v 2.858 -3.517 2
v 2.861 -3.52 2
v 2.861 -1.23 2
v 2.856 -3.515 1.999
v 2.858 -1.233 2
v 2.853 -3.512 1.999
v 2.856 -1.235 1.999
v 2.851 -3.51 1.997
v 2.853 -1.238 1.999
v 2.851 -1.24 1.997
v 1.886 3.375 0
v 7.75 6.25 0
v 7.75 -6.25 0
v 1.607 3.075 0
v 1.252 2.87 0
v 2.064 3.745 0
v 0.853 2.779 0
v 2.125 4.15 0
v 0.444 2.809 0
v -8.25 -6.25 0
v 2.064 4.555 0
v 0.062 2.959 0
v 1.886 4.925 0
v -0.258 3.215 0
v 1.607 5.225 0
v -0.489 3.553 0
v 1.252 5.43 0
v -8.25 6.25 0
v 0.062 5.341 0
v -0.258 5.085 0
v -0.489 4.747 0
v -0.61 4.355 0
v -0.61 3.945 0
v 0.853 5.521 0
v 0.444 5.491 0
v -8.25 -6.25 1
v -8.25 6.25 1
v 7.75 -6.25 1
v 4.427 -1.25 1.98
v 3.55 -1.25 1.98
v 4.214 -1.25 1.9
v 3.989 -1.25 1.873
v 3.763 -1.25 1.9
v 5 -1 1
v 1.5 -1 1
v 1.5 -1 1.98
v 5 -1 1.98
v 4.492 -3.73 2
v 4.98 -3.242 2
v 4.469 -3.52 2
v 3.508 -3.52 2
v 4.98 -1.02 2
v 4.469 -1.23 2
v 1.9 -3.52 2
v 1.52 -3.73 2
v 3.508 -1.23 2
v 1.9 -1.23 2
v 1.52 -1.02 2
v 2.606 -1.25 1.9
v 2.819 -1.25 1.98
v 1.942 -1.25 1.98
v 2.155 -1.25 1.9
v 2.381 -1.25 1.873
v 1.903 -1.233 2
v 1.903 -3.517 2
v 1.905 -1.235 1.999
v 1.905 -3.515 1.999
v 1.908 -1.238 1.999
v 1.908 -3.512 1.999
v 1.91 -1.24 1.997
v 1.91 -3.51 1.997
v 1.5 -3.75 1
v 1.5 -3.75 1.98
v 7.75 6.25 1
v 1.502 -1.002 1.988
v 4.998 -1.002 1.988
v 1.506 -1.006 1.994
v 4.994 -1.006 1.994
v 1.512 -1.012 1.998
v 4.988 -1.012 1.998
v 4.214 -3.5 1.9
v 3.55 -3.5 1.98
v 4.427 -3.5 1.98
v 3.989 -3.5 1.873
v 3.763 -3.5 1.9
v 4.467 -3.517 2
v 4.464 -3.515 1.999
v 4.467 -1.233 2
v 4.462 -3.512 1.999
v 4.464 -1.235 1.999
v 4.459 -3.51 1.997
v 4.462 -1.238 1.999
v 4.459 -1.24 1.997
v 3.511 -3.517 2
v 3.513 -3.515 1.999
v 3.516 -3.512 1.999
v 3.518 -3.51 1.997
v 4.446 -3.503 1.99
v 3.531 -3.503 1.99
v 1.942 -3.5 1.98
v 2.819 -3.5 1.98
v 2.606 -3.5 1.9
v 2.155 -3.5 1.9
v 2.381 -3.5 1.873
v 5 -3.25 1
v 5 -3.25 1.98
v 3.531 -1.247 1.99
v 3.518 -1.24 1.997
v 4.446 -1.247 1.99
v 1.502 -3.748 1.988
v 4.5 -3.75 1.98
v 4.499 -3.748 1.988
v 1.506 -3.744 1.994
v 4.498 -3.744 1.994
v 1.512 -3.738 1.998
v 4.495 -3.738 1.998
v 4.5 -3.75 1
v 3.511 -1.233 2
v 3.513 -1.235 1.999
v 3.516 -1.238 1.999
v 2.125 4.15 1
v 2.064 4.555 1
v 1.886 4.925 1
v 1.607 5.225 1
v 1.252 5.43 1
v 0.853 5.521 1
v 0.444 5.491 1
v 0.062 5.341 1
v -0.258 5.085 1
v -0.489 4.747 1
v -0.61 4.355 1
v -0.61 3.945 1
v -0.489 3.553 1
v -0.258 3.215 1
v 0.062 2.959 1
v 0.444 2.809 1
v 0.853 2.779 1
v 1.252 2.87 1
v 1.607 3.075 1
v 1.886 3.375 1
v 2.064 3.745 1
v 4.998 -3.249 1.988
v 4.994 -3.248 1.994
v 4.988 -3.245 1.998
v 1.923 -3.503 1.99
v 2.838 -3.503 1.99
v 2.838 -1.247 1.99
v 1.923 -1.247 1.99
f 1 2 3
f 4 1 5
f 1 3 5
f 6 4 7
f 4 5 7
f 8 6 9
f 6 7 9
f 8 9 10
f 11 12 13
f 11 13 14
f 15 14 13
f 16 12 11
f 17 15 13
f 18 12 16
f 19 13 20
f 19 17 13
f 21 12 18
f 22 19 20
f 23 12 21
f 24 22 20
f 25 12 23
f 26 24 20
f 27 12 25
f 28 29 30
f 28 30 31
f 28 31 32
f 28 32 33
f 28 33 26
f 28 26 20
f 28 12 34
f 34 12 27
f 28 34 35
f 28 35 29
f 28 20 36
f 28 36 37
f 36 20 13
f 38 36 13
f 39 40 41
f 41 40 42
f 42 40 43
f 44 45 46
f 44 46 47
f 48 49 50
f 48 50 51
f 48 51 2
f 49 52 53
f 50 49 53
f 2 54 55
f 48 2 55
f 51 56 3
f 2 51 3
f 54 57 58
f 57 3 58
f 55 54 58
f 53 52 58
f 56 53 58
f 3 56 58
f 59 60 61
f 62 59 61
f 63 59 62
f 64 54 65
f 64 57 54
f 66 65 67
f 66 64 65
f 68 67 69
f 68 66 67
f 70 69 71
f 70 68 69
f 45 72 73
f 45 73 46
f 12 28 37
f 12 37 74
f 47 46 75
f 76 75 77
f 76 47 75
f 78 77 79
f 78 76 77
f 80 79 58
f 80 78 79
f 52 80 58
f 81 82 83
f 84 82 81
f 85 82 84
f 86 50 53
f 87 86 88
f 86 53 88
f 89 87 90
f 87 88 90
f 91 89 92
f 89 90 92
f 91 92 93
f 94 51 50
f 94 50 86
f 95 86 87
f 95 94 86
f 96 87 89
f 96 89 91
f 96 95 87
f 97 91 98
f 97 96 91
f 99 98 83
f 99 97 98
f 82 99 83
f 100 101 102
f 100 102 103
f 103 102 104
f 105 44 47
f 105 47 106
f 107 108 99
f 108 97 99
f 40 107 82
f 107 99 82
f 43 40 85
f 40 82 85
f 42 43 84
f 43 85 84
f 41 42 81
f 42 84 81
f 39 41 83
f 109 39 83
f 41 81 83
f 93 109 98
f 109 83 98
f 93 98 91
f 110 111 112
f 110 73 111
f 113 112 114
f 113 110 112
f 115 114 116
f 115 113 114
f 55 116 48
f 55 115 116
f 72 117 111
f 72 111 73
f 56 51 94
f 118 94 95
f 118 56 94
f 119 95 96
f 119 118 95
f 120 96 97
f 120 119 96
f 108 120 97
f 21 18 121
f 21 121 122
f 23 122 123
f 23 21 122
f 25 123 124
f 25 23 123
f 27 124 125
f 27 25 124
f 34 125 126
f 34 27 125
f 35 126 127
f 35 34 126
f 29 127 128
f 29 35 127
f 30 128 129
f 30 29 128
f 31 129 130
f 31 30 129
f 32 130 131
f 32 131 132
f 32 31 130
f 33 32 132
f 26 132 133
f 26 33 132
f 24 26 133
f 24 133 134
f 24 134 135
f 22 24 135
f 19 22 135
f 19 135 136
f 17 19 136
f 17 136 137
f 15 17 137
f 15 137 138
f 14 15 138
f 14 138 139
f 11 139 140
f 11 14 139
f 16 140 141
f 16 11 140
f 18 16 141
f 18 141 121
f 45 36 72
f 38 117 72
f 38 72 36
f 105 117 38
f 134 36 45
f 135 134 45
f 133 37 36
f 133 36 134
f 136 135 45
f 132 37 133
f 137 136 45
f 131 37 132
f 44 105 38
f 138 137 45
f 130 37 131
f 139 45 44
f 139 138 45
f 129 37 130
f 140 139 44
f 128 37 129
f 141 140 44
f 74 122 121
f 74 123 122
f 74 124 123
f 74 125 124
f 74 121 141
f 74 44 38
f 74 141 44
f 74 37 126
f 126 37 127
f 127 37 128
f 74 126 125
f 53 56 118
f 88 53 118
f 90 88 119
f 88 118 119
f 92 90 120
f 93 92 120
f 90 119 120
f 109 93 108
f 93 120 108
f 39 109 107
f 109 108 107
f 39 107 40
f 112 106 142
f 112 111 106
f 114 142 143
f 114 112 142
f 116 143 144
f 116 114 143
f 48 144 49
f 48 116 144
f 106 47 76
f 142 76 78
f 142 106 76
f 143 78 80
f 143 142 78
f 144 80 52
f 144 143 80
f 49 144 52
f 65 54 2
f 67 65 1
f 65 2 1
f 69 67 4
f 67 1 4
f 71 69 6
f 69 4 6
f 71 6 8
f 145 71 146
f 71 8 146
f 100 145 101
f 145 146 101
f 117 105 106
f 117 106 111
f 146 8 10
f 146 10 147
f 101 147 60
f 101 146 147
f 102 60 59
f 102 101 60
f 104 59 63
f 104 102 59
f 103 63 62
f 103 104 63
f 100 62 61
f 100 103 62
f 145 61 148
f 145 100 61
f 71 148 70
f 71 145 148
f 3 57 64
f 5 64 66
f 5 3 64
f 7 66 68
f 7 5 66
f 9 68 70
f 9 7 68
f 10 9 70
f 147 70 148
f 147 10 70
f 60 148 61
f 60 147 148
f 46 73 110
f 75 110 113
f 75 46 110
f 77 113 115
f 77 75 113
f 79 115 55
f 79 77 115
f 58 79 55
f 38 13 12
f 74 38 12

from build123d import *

# Parameters (mm, degrees)
ESQUISSE1_W             = 16
ESQUISSE1_H             = 12.5
ESQUISSE1_R             = 1.375
EXTRUSION1_DEPTH        = 1
EXTRUSION2_DEPTH        = 2
ENL_V_MAT_EXTRU_1_DEPTH = 2.25
CONG_1_R                = 0.02


with BuildPart() as part:
    # Esquisse1 → Extrusion1 (new body)
    with BuildSketch(Plane.XY):
        with Locations((-0.25, 0)):
            Rectangle(ESQUISSE1_W, ESQUISSE1_H)
        with Locations((0.75, 4.15)):
            Circle(ESQUISSE1_R, mode=Mode.SUBTRACT)
    extrude(amount=EXTRUSION1_DEPTH)

    # Esquisse3 → Extrusion2 (add)
    with BuildSketch(Plane.XY):
        Polygon((1.5, -1), (5, -1), (5, -3.25), (4.5, -3.75), (1.5, -3.75), align=None)
    extrude(amount=EXTRUSION2_DEPTH)

    # Esquisse4 → Enlèv. mat.-Extru.1 (cut)
    with BuildSketch(Plane.XZ.offset(3.5)):
        with BuildLine():
            Line((1.905461948, 2), (2.855665367, 2))
            ThreePointArc((2.855665367, 2), (2.380563657, 1.872882694), (1.905461948, 2))
        make_face()
        with BuildLine():
            Line((4.463762682, 2), (3.513559263, 2))
            ThreePointArc((3.513559263, 2), (3.988660973, 1.872882694), (4.463762682, 2))
        make_face()
    extrude(amount=-ENL_V_MAT_EXTRU_1_DEPTH, mode=Mode.SUBTRACT)

    # Congé1
    cong_1_edges = [part.edges().sort_by_distance(p)[0] for p in [
        (3.25, -1, 2),
        (5, -2.125, 2),
        (4.75, -3.5, 2),
        (3, -3.75, 2),
        (1.5, -2.375, 2),
        (3.988660973, -3.5, 2),
        (3.513559263, -2.375, 2),
        (3.988660973, -1.25, 2),
        (4.463762682, -2.375, 2),
        (1.905461948, -2.375, 2),
        (2.380563657, -1.25, 2),
        (2.855665367, -2.375, 2),
        (2.380563657, -3.5, 2),
    ]]
    fillet(cong_1_edges, radius=CONG_1_R)


solid = part.part
